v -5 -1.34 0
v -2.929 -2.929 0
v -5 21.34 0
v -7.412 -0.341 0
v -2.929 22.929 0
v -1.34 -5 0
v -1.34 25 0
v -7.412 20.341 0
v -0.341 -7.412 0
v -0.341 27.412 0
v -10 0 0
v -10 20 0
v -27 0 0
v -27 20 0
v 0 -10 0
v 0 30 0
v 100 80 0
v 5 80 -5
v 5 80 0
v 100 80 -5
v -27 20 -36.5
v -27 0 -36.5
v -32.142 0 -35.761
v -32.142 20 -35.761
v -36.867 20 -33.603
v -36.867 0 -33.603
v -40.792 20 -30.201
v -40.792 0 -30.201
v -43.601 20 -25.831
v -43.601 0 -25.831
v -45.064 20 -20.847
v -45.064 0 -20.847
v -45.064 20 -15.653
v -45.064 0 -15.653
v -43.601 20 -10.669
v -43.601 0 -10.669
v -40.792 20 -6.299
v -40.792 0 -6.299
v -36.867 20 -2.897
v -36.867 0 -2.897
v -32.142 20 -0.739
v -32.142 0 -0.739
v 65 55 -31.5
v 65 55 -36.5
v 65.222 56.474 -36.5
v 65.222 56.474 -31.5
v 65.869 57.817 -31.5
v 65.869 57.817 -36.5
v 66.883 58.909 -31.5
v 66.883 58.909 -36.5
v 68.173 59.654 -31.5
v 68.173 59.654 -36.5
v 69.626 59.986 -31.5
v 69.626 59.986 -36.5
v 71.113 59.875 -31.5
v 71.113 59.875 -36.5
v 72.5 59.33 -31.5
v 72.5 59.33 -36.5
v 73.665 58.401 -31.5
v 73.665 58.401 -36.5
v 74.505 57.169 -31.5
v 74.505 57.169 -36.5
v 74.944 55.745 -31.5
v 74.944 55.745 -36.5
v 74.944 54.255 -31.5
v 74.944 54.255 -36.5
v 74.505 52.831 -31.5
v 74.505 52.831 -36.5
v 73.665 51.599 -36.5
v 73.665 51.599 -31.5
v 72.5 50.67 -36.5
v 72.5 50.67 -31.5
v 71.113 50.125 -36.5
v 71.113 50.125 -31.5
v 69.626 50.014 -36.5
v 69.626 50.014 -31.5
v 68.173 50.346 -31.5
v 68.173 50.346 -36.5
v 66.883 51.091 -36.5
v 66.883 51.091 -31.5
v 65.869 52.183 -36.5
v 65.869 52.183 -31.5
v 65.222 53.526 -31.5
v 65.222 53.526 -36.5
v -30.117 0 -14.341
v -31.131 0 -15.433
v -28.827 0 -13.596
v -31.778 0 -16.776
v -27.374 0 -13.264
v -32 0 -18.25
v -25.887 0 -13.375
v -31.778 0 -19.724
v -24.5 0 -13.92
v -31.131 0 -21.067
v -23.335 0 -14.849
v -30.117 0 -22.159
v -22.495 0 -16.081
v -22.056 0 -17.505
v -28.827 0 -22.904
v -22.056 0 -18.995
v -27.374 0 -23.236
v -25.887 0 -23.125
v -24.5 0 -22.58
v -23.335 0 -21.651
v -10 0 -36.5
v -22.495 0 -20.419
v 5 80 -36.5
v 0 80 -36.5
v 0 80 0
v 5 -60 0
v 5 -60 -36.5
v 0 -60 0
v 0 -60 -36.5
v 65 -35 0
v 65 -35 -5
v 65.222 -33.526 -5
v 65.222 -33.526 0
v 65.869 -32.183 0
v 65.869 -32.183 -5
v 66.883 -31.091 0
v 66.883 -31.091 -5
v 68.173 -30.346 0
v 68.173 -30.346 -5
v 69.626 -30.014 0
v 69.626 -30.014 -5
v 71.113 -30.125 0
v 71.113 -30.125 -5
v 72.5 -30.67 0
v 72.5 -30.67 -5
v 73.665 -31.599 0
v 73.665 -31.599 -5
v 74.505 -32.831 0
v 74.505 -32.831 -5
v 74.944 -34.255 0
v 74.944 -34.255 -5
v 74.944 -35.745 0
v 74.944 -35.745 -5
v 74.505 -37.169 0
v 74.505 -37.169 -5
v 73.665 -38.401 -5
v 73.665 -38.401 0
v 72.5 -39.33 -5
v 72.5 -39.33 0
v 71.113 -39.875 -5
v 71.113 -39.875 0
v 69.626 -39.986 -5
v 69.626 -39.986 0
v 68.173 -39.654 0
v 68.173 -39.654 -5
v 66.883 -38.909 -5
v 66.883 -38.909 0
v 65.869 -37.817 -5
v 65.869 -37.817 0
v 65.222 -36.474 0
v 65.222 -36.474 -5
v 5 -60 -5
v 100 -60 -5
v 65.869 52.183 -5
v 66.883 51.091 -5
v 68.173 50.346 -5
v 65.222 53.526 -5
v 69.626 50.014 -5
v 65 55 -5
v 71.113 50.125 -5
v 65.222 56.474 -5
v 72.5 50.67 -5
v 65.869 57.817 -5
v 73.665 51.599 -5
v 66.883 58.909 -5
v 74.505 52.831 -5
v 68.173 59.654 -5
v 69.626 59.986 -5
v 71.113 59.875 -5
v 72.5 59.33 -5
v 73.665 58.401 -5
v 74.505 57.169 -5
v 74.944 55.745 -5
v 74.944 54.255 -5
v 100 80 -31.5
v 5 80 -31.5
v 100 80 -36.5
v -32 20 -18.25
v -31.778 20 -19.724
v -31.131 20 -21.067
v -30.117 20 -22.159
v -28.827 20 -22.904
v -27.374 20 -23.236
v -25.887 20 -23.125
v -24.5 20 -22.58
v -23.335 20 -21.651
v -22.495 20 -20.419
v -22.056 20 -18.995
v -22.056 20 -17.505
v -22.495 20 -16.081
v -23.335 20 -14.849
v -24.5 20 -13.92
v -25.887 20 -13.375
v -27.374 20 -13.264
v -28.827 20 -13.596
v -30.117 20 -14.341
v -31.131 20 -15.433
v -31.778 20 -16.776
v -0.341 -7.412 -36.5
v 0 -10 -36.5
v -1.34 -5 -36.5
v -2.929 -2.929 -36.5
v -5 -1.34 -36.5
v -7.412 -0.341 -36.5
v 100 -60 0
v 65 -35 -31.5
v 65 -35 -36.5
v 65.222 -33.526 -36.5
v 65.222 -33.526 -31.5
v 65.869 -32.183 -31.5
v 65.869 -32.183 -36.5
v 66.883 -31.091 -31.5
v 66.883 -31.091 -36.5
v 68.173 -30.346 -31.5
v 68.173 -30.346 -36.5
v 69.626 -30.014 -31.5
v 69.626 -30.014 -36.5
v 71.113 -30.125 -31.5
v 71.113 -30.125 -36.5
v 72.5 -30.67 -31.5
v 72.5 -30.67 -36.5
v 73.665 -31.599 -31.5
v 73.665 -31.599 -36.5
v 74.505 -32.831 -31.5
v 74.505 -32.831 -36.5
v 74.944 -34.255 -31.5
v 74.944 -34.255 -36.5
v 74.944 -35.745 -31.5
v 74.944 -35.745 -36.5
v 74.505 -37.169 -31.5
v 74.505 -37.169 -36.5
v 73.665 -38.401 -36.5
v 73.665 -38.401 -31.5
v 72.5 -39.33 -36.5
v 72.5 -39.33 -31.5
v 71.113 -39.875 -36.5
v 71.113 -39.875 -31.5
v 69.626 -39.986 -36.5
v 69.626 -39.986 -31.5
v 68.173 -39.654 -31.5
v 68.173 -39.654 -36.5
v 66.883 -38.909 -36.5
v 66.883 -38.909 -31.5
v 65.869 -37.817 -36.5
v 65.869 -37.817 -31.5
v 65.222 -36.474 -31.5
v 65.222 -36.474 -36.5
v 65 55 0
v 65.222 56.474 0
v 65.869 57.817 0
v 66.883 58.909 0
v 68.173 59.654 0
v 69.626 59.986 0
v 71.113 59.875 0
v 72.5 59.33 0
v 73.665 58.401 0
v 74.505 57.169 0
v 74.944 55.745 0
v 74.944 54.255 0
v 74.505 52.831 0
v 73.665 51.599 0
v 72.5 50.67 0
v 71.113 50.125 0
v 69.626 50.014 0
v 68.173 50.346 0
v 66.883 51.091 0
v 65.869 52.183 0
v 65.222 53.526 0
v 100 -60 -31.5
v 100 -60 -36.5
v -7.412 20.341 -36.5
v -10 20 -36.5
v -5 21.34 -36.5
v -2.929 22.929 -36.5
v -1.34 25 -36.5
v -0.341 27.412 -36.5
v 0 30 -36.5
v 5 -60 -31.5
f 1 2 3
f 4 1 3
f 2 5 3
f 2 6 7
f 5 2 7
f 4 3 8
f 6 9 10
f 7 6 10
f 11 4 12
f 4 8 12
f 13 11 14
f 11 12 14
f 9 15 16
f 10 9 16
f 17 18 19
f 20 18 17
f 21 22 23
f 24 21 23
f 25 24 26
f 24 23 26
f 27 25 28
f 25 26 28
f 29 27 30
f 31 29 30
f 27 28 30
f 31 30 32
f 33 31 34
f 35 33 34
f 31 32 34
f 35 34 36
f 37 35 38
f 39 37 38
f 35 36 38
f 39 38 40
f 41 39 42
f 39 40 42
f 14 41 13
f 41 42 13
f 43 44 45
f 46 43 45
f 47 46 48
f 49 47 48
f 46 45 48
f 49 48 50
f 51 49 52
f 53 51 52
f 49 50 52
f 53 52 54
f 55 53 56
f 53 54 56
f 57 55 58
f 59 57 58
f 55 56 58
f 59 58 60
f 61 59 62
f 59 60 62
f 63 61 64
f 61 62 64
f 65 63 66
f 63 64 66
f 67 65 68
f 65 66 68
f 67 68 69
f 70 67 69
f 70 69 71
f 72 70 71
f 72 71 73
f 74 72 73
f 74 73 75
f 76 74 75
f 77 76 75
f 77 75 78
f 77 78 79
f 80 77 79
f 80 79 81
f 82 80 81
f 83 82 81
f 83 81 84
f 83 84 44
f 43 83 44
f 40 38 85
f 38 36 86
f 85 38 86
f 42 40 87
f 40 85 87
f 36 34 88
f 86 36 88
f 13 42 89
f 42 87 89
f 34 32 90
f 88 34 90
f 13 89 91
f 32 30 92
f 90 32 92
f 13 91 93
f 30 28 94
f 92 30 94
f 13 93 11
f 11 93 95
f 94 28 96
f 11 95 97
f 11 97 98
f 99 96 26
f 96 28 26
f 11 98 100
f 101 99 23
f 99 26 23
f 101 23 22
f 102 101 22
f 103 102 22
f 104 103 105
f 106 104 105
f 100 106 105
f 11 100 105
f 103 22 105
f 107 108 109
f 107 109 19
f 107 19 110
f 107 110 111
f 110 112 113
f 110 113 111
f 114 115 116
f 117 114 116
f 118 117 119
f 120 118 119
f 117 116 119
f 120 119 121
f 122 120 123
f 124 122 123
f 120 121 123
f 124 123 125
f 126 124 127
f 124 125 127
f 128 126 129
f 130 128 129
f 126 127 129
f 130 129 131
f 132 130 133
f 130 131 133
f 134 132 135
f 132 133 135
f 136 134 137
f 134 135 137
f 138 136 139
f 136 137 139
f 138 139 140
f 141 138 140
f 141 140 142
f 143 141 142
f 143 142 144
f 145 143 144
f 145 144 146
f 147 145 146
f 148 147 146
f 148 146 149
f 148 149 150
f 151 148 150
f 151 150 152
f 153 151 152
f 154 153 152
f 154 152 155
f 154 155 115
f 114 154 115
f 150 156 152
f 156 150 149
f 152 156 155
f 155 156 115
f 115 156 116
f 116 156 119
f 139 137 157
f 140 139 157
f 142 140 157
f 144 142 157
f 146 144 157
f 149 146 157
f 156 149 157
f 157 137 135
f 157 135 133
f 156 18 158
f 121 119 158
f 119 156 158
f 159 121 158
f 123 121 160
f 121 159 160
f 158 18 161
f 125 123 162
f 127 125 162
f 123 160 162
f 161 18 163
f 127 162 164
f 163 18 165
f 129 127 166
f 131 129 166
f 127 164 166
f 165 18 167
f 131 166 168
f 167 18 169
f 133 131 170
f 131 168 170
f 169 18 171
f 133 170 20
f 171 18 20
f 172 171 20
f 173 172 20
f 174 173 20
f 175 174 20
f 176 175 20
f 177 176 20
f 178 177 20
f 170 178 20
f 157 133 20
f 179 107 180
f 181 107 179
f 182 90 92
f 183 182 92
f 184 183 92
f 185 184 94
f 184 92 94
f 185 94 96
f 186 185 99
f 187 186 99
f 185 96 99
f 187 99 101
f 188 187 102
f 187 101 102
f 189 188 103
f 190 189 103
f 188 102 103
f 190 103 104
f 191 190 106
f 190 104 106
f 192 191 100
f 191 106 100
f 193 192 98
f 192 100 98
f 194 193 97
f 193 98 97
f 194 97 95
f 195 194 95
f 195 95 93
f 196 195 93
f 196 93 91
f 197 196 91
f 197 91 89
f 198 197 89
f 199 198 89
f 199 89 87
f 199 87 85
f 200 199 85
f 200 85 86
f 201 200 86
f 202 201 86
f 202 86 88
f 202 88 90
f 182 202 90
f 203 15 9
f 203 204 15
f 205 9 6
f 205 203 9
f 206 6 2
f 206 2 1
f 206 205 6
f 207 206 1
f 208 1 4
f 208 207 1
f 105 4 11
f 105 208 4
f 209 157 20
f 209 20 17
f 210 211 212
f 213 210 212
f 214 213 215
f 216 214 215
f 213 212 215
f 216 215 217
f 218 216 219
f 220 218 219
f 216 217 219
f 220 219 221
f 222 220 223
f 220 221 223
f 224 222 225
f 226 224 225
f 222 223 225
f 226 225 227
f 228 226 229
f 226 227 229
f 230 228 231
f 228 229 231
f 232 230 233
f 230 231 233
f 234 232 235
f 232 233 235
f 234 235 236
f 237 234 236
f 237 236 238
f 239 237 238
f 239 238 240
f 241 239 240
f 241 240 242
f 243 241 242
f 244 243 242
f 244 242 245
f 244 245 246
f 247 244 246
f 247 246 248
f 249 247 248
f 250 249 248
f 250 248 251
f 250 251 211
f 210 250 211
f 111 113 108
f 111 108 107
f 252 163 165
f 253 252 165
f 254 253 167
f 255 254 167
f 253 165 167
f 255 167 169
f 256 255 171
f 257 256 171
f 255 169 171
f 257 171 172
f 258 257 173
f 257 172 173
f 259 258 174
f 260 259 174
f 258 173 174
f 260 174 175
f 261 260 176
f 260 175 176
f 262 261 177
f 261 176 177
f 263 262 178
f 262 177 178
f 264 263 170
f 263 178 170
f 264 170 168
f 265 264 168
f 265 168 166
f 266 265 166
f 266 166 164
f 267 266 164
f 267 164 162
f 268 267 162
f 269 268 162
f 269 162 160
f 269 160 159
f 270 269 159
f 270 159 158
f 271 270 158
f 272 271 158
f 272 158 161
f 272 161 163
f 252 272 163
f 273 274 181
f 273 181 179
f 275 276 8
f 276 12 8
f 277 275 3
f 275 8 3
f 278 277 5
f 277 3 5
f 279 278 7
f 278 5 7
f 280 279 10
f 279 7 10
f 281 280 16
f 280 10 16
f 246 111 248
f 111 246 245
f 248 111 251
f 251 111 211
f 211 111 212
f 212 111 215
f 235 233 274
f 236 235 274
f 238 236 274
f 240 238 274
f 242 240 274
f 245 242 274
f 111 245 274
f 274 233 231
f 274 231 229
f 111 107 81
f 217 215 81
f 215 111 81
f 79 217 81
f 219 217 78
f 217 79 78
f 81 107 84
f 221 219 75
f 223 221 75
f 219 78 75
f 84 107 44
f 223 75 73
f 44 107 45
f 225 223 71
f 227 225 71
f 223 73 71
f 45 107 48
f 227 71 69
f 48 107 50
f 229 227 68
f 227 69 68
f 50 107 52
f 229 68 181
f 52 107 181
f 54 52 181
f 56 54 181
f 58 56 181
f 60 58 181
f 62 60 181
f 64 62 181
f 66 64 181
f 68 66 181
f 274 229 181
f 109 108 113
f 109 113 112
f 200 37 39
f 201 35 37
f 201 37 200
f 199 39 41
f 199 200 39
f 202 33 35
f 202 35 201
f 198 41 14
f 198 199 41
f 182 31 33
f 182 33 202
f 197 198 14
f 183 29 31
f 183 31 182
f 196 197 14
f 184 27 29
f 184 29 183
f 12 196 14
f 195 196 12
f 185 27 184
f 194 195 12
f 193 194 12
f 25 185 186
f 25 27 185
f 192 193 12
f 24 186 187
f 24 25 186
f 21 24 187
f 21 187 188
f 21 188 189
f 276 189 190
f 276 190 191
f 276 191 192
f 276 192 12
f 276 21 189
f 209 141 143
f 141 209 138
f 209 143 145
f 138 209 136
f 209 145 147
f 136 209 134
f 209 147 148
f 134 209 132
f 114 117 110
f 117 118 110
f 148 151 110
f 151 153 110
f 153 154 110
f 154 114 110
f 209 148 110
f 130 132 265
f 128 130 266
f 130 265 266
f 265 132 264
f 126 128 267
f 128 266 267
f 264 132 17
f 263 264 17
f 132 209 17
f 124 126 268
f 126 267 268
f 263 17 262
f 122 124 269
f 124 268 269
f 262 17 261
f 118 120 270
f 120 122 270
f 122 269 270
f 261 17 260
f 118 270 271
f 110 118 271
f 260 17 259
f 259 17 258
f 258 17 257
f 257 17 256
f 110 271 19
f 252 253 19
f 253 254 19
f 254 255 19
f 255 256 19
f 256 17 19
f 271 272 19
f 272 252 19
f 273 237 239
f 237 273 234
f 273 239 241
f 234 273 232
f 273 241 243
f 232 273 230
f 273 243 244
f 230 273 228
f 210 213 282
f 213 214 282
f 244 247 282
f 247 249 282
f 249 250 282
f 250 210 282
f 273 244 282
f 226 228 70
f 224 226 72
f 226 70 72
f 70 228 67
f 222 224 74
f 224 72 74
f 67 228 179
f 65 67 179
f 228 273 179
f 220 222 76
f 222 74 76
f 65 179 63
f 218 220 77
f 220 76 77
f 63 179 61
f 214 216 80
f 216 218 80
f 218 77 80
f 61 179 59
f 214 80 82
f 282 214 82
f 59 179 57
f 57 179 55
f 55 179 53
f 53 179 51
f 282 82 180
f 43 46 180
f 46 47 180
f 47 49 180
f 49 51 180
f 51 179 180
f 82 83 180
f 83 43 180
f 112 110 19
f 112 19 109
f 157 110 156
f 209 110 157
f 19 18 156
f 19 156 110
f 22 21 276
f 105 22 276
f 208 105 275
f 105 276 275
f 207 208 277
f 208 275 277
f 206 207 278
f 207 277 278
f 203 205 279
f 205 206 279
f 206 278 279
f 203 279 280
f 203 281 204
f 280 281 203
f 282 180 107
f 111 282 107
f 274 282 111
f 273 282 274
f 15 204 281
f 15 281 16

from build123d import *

# Parameters (mm, degrees)
BOSS_EXTRUDE1_DEPTH      = 20
BOSS_EXTRUDE2_DEPTH      = 60
BOSS_EXTRUDE3_DEPTH      = 60
M8_CLEARANCE_HOLE1_D     = 10
M8_CLEARANCE_HOLE2_D     = 10
FILLET2_R                = 10
SPLIT1_SURFACE_1_1_BACK  = 206.012
SPLIT1_SURFACE_1_1_DEPTH = 412.024
SPLIT1_SURFACE_1_2_BACK  = 206.012
SPLIT1_SURFACE_1_2_DEPTH = 412.024
SPLIT1_SURFACE_2_3_BACK  = 206.012
SPLIT1_SURFACE_2_3_DEPTH = 412.024
SPLIT1_SURFACE_2_4_BACK  = 206.012
SPLIT1_SURFACE_2_4_DEPTH = 412.024
SPLIT1_SURFACE_3_5_BACK  = 206.012
SPLIT1_SURFACE_3_5_DEPTH = 412.024
SPLIT1_SURFACE_3_6_BACK  = 206.012
SPLIT1_SURFACE_3_6_DEPTH = 412.024


with BuildPart() as part:
    # Sketch1 → Boss-Extrude1 (new body)
    with BuildSketch(Plane(origin=(0, 0, 0), x_dir=(1, 0, 0), z_dir=(0, 1, 0))):
        with BuildLine():
            Line((5, 5), (5, 31.5))
            Line((5, 31.5), (100, 31.5))
            Line((100, 31.5), (100, 36.5))
            Line((100, 36.5), (-27, 36.5))
            ThreePointArc((-27, 36.5), (-45.25, 18.25), (-27, 0))
            Line((-27, 0), (100, 0))
            Line((100, 0), (100, 5))
            Line((100, 5), (5, 5))
        make_face()
    extrude(amount=BOSS_EXTRUDE1_DEPTH)

    # Sketch2 → Boss-Extrude2 (add)
    with BuildSketch(Plane(origin=(0, 20, 0), x_dir=(1, 0, 0), z_dir=(0, 1, 0))):
        Polygon((0, 0), (100, 0), (100, 5), (5, 5), (5, 31.5), (100, 31.5), (100, 36.5), (0, 36.5), align=None)
    extrude(amount=BOSS_EXTRUDE2_DEPTH)

    # Sketch3 → Boss-Extrude3 (add)
    with BuildSketch(Plane.XZ):
        Polygon((0, -36.5), (100, -36.5), (100, -31.5), (5, -31.5), (5, -5), (100, -5), (100, 0), (0, 0), align=None)
    extrude(amount=BOSS_EXTRUDE3_DEPTH)

    # M8 Clearance Hole1 (through all)
    with Locations(Plane(origin=(0, 20, 0), x_dir=(1, 0, 0), z_dir=(0, 1, 0))):
        with Locations((-27, 18.25)):
            Hole(M8_CLEARANCE_HOLE1_D / 2)

    # M8 Clearance Hole2 (through all)
    with Locations(Plane.XY):
        with Locations((70, 55), (70, -35)):
            Hole(M8_CLEARANCE_HOLE2_D / 2)

    # Fillet2
    fillet2_edges = [part.edges().sort_by_distance(p)[0] for p in [
        (0, 20, -18.25),
        (0, 0, -18.25),
    ]]
    fillet(fillet2_edges, radius=FILLET2_R)


with BuildPart() as body_2:
    # Split1: the piece behind the surface
    add(part.part)
    # Split1 surface 1: a surface, the sketch's curves swept straight by 412.024 mm
    with BuildLine(Plane(origin=(0, 0, 0), x_dir=(1, 0, 0), z_dir=(0, 1, 0)).offset(-SPLIT1_SURFACE_1_1_BACK), mode=Mode.PRIVATE) as split1_surface_1_1_path:
        Line((0, 36.5), (0, 0))
    split1_surface_1_1 = Shell.extrude(split1_surface_1_1_path.wire(), (0 * SPLIT1_SURFACE_1_1_DEPTH, 1 * SPLIT1_SURFACE_1_1_DEPTH, 0 * SPLIT1_SURFACE_1_1_DEPTH))
    split(bisect_by=split1_surface_1_1, keep=Keep.BOTTOM)


with BuildPart() as part_1:
    add(part.part)

    # Split1: split by a surface, the side it looks to stays
    # Split1 surface 1: a surface, the sketch's curves swept straight by 412.024 mm
    with BuildLine(Plane(origin=(0, 0, 0), x_dir=(1, 0, 0), z_dir=(0, 1, 0)).offset(-SPLIT1_SURFACE_1_2_BACK), mode=Mode.PRIVATE) as split1_surface_1_2_path:
        Line((0, 36.5), (0, 0))
    split1_surface_1_2 = Shell.extrude(split1_surface_1_2_path.wire(), (0 * SPLIT1_SURFACE_1_2_DEPTH, 1 * SPLIT1_SURFACE_1_2_DEPTH, 0 * SPLIT1_SURFACE_1_2_DEPTH))
    split(bisect_by=split1_surface_1_2, keep=Keep.TOP)


with BuildPart() as body_3:
    # Split1 2: the piece behind the surface
    add(part_1.part)
    # Split1 surface 2: a surface, the sketch's curves swept straight by 412.024 mm
    with BuildLine(Plane(origin=(0, 0, 0), x_dir=(1, 0, 0), z_dir=(0, 1, 0)).offset(-SPLIT1_SURFACE_2_3_BACK), mode=Mode.PRIVATE) as split1_surface_2_3_path:
        Line((5, 5), (5, 0))
    split1_surface_2_3 = Shell.extrude(split1_surface_2_3_path.wire(), (0 * SPLIT1_SURFACE_2_3_DEPTH, 1 * SPLIT1_SURFACE_2_3_DEPTH, 0 * SPLIT1_SURFACE_2_3_DEPTH))
    split(bisect_by=split1_surface_2_3, keep=Keep.BOTTOM)


with BuildPart() as part_2:
    add(part_1.part)

    # Split1 2: split by a surface, the side it looks to stays
    # Split1 surface 2: a surface, the sketch's curves swept straight by 412.024 mm
    with BuildLine(Plane(origin=(0, 0, 0), x_dir=(1, 0, 0), z_dir=(0, 1, 0)).offset(-SPLIT1_SURFACE_2_4_BACK), mode=Mode.PRIVATE) as split1_surface_2_4_path:
        Line((5, 5), (5, 0))
    split1_surface_2_4 = Shell.extrude(split1_surface_2_4_path.wire(), (0 * SPLIT1_SURFACE_2_4_DEPTH, 1 * SPLIT1_SURFACE_2_4_DEPTH, 0 * SPLIT1_SURFACE_2_4_DEPTH))
    split(bisect_by=split1_surface_2_4, keep=Keep.TOP)


with BuildPart() as body_4_2:
    # Split1 3 body 3: the piece behind the surface
    add(body_3.part)
    # Split1 surface 3: a surface, the sketch's curves swept straight by 412.024 mm
    with BuildLine(Plane(origin=(0, 0, 0), x_dir=(1, 0, 0), z_dir=(0, 1, 0)).offset(-SPLIT1_SURFACE_3_5_BACK), mode=Mode.PRIVATE) as split1_surface_3_5_path:
        Line((5, 31.5), (5, 36.5))
    split1_surface_3_5 = Shell.extrude(split1_surface_3_5_path.wire(), (0 * SPLIT1_SURFACE_3_5_DEPTH, 1 * SPLIT1_SURFACE_3_5_DEPTH, 0 * SPLIT1_SURFACE_3_5_DEPTH))
    split(bisect_by=split1_surface_3_5, keep=Keep.BOTTOM)


with BuildPart() as body_3_1:
    add(body_3.part)

    # Split1 3 body 3: split by a surface, the side it looks to stays
    # Split1 surface 3: a surface, the sketch's curves swept straight by 412.024 mm
    with BuildLine(Plane(origin=(0, 0, 0), x_dir=(1, 0, 0), z_dir=(0, 1, 0)).offset(-SPLIT1_SURFACE_3_6_BACK), mode=Mode.PRIVATE) as split1_surface_3_6_path:
        Line((5, 31.5), (5, 36.5))
    split1_surface_3_6 = Shell.extrude(split1_surface_3_6_path.wire(), (0 * SPLIT1_SURFACE_3_6_DEPTH, 1 * SPLIT1_SURFACE_3_6_DEPTH, 0 * SPLIT1_SURFACE_3_6_DEPTH))
    split(bisect_by=split1_surface_3_6, keep=Keep.TOP)


solid = Compound([body_2.part, part_2.part, body_4_2.part, body_3_1.part])
